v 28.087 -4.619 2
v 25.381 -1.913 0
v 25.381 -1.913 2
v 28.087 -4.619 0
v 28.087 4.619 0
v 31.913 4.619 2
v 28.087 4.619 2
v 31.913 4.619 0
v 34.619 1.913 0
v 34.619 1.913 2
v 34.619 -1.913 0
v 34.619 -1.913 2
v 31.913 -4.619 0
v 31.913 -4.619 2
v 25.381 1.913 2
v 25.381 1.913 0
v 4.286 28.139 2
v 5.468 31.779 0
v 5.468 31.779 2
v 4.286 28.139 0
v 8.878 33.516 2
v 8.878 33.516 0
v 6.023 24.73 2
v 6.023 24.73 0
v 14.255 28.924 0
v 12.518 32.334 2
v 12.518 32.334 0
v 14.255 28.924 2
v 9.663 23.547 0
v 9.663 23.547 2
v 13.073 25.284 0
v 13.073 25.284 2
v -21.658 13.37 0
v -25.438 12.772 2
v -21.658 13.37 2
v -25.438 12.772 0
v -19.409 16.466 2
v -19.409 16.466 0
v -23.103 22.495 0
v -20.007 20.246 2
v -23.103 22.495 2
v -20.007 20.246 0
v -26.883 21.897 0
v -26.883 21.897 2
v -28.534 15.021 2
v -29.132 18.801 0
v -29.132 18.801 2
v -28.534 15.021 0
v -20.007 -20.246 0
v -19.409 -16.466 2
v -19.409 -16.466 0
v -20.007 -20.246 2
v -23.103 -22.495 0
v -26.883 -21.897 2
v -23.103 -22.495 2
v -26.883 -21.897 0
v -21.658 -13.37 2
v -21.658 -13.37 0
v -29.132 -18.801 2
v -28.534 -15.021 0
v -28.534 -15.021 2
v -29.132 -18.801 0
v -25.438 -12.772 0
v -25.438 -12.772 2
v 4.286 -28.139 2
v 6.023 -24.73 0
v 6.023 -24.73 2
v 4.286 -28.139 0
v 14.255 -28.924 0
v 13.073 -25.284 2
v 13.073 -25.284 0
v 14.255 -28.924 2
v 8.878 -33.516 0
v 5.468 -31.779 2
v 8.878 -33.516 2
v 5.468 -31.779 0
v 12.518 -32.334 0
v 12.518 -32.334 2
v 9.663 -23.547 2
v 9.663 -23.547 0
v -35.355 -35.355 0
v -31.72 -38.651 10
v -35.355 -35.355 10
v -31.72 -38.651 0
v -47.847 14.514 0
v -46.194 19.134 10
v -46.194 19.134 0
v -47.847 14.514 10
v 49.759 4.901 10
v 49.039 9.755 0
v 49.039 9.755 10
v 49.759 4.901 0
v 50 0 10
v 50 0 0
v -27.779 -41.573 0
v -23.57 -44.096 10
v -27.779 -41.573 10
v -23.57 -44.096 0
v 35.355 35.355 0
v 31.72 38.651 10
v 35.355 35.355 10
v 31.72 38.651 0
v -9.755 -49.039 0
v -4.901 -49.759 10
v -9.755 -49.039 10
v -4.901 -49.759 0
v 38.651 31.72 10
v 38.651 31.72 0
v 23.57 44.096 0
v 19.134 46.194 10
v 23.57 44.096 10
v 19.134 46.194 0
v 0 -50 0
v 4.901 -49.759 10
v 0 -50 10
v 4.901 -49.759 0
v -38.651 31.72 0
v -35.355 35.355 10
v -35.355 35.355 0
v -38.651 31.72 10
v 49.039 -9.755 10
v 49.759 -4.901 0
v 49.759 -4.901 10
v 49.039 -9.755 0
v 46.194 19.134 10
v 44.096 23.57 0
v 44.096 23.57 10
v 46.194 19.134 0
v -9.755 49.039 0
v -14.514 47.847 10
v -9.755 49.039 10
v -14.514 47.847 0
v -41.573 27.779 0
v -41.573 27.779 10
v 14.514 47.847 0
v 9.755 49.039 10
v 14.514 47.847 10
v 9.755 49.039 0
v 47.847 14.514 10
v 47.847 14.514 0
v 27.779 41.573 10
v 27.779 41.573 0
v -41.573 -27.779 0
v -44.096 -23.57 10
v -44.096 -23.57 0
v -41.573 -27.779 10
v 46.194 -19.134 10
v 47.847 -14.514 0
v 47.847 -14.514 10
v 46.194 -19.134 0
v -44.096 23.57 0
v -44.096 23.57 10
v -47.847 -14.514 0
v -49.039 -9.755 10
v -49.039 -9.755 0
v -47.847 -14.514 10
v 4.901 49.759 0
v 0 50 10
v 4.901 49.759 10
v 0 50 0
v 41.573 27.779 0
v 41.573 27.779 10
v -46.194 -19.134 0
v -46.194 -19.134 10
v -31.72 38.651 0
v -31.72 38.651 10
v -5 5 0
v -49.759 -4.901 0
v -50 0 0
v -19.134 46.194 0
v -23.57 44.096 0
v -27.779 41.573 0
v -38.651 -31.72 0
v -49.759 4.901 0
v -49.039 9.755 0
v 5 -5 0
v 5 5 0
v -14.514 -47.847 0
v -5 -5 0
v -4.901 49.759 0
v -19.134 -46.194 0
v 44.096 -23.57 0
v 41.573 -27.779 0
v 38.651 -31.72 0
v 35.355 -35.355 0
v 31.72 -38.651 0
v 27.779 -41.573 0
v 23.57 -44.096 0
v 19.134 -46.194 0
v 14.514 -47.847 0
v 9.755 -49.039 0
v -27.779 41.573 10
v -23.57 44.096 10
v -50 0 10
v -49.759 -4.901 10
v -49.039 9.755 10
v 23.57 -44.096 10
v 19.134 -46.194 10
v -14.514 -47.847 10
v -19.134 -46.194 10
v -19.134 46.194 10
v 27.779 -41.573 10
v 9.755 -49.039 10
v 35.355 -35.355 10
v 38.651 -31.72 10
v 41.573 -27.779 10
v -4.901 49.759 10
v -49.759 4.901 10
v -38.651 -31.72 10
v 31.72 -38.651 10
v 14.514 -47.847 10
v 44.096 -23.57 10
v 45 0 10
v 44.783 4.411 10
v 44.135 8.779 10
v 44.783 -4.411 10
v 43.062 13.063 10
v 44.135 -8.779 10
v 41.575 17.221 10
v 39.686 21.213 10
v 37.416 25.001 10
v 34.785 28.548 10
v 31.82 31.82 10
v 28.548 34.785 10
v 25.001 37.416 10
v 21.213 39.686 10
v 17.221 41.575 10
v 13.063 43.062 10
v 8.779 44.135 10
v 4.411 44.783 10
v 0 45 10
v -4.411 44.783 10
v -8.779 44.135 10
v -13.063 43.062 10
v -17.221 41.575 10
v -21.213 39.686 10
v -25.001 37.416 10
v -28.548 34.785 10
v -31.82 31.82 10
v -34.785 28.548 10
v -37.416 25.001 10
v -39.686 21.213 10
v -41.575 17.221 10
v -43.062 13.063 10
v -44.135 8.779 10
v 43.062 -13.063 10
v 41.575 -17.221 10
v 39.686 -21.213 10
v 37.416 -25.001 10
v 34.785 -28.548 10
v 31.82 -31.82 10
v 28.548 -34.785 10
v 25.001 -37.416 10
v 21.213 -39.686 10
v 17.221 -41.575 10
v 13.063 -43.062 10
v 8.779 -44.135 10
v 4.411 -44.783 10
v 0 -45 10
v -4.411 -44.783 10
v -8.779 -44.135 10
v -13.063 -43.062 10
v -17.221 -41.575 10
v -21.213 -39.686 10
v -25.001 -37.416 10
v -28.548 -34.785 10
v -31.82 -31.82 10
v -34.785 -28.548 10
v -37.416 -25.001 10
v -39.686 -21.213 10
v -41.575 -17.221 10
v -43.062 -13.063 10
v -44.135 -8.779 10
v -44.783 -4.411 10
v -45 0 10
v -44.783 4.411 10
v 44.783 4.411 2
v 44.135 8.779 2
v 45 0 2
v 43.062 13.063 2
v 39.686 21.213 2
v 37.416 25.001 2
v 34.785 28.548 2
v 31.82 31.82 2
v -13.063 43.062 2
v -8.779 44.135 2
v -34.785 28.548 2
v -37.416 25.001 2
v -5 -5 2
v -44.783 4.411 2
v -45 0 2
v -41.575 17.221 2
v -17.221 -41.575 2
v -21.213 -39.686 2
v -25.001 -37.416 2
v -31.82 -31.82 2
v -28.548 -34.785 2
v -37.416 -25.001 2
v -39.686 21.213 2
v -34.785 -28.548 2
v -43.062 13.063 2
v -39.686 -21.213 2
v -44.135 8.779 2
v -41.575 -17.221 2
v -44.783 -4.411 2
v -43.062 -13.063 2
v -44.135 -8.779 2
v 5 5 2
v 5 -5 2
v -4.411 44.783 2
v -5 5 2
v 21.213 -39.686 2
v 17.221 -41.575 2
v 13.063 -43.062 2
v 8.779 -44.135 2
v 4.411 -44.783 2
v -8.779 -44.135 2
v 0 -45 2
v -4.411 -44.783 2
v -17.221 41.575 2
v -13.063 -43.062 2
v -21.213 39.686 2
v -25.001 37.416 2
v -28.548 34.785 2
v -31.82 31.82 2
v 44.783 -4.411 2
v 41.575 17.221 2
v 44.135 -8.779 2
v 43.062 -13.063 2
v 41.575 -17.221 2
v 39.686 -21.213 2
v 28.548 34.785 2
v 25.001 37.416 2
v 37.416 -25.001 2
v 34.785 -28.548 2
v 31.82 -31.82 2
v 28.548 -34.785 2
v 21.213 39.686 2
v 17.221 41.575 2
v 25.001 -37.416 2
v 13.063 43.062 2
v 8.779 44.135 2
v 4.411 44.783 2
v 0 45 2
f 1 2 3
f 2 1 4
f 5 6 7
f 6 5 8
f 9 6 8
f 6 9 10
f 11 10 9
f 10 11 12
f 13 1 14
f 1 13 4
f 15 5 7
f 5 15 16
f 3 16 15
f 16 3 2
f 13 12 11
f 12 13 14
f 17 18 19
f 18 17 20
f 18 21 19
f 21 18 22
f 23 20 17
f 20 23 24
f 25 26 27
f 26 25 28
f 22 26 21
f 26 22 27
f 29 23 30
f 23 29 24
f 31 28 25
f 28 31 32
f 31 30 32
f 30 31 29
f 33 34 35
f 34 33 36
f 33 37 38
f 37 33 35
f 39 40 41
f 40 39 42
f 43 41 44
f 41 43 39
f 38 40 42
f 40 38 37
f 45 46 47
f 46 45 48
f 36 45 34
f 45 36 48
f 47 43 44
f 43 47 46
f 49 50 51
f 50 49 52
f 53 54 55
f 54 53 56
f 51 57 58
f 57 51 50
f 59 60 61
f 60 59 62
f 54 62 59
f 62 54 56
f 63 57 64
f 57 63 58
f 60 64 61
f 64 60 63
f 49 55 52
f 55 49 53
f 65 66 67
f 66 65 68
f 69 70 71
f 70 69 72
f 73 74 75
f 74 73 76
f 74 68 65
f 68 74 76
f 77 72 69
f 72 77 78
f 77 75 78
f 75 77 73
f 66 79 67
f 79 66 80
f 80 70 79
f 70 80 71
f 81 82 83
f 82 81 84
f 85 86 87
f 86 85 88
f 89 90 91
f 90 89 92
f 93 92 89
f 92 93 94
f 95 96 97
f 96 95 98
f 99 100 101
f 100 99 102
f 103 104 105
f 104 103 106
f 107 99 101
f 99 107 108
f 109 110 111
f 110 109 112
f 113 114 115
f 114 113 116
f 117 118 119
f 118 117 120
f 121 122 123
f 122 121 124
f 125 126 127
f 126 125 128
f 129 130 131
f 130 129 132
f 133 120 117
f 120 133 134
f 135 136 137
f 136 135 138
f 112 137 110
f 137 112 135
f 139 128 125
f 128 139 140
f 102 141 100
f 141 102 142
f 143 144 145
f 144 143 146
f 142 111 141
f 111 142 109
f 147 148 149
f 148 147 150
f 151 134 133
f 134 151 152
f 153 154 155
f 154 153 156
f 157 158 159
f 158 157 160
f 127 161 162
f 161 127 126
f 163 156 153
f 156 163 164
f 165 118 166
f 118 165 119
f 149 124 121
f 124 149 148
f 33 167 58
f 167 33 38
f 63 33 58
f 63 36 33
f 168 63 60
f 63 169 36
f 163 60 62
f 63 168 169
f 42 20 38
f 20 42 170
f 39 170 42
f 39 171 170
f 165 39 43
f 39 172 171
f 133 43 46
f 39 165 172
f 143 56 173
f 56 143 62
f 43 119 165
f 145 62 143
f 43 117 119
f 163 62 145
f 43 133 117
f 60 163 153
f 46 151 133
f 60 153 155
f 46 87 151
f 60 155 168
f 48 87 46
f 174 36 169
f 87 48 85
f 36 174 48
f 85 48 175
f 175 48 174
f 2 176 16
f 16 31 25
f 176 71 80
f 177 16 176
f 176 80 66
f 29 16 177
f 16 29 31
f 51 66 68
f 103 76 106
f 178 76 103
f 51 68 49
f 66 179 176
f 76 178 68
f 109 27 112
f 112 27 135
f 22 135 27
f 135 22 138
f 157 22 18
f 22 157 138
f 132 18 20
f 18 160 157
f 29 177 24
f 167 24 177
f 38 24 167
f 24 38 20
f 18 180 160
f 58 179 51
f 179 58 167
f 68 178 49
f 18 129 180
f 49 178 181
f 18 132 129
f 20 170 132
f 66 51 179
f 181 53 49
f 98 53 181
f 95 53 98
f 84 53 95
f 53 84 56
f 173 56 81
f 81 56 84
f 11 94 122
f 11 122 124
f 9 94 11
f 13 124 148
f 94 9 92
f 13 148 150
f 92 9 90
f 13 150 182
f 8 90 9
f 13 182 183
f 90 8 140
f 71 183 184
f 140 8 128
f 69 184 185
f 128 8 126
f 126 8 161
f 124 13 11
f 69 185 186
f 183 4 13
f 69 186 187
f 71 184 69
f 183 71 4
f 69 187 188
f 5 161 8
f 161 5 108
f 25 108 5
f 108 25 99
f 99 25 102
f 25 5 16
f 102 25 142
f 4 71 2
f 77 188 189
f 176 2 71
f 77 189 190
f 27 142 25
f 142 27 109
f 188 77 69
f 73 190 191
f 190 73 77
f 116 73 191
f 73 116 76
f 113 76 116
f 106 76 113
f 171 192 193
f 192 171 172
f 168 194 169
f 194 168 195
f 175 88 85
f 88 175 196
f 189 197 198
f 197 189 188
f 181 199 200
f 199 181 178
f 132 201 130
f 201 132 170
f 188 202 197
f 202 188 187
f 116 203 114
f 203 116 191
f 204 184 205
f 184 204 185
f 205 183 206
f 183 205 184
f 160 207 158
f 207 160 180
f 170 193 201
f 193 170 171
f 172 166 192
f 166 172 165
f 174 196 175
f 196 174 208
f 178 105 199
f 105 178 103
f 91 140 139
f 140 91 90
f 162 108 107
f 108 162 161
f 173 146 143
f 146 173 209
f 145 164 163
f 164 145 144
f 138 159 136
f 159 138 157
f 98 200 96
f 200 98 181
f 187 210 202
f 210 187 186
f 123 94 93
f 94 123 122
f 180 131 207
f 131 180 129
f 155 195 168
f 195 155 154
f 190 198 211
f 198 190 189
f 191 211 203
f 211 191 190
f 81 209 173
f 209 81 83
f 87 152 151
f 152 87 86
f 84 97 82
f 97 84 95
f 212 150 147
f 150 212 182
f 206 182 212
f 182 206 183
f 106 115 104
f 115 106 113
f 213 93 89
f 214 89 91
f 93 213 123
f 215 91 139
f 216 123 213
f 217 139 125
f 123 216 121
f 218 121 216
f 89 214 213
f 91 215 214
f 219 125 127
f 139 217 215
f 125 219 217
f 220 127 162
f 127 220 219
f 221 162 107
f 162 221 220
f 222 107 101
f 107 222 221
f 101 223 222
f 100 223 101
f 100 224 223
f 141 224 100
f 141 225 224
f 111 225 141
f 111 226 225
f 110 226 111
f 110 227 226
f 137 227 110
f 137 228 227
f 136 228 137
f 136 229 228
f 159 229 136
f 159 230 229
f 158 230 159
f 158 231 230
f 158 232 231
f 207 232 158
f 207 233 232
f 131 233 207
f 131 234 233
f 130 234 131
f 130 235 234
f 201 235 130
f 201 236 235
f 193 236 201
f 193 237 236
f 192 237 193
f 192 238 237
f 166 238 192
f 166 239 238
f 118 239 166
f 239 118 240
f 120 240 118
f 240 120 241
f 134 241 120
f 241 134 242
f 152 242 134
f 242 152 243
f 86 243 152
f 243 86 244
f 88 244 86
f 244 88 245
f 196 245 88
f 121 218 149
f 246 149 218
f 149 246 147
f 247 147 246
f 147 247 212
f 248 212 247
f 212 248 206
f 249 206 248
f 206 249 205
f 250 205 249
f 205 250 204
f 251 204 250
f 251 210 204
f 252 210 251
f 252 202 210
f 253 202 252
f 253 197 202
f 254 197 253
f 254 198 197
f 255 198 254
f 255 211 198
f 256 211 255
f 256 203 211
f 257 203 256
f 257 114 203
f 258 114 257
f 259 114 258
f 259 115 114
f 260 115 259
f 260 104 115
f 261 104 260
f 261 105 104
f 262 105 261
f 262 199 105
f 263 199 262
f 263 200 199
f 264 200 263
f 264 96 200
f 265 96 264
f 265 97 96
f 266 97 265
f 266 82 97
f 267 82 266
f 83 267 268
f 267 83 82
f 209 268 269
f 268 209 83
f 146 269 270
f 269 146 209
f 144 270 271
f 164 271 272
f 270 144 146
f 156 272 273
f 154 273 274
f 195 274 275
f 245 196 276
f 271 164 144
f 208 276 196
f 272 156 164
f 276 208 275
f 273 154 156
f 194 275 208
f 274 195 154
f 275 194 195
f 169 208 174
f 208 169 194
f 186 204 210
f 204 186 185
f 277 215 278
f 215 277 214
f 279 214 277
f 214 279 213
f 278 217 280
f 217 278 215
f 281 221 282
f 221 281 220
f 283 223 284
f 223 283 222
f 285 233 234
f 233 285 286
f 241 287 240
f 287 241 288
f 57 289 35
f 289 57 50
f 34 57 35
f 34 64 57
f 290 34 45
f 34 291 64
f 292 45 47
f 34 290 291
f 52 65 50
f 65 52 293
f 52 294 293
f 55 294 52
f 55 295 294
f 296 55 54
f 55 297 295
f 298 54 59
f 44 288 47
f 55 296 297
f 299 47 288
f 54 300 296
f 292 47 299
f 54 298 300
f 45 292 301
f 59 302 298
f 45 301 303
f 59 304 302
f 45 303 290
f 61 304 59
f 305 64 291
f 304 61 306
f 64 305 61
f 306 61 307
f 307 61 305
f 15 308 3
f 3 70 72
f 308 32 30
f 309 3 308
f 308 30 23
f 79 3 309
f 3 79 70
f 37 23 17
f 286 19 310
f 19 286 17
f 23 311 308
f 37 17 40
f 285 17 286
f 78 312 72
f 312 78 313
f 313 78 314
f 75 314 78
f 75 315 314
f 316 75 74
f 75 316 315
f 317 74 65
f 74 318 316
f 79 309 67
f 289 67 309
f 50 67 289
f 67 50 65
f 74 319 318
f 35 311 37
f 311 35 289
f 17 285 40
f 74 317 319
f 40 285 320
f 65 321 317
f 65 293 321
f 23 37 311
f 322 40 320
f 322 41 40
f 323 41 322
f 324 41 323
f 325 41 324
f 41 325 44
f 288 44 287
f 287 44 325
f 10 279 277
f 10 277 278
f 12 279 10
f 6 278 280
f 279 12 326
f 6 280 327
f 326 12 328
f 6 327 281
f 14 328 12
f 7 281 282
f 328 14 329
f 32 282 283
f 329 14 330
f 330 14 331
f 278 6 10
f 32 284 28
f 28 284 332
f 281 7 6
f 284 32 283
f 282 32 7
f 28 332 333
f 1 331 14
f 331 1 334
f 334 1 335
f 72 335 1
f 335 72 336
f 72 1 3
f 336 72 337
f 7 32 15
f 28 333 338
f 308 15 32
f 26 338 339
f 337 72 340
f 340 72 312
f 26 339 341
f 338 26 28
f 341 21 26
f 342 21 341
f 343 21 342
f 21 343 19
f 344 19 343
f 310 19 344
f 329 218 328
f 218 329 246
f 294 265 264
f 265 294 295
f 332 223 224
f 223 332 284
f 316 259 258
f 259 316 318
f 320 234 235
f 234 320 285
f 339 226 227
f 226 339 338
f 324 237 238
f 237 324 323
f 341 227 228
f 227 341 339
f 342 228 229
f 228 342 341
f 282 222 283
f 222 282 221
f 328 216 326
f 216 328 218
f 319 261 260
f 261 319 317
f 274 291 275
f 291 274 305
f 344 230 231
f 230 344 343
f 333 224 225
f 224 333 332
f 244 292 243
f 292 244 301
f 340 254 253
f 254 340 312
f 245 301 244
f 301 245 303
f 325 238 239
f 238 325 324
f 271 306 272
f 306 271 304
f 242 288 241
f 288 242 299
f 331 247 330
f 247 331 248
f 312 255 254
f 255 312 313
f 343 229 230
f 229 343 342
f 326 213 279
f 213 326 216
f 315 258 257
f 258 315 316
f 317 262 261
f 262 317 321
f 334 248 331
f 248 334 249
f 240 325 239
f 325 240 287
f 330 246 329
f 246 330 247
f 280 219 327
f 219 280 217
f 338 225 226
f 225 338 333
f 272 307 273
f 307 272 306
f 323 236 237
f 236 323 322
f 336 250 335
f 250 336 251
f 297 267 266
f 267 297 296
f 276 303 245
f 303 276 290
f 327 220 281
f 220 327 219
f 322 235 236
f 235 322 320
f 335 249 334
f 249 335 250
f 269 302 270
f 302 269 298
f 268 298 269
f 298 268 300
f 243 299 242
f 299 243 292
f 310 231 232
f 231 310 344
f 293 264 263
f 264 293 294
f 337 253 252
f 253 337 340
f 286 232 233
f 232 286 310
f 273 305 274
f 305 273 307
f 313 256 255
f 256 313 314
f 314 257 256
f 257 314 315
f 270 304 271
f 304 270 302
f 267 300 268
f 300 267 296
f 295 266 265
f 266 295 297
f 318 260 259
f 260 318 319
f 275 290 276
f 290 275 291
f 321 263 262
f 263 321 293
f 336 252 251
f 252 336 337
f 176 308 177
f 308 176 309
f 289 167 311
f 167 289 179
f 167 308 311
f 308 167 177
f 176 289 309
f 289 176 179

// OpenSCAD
module wheel_hub() {
    difference() {
        // Outer rim
        cylinder(h=10, r=50, $fn=64);
        
        // Recessed inner face
        translate([0, 0, 2])
            cylinder(h=8, r=45, $fn=64);
        
        // Central square through-hole
        translate([-5, -5, -1])
            cube([10, 10, 12]);
        
        // Bolt circle with octagonal through-holes
        for (i = [0:4]) {
            rotate([0, 0, i * 72])
                translate([30, 0, -1])
                    rotate([0, 0, 22.5])
                        cylinder(h=12, r=5, $fn=8);
        }
    }
}

wheel_hub();
